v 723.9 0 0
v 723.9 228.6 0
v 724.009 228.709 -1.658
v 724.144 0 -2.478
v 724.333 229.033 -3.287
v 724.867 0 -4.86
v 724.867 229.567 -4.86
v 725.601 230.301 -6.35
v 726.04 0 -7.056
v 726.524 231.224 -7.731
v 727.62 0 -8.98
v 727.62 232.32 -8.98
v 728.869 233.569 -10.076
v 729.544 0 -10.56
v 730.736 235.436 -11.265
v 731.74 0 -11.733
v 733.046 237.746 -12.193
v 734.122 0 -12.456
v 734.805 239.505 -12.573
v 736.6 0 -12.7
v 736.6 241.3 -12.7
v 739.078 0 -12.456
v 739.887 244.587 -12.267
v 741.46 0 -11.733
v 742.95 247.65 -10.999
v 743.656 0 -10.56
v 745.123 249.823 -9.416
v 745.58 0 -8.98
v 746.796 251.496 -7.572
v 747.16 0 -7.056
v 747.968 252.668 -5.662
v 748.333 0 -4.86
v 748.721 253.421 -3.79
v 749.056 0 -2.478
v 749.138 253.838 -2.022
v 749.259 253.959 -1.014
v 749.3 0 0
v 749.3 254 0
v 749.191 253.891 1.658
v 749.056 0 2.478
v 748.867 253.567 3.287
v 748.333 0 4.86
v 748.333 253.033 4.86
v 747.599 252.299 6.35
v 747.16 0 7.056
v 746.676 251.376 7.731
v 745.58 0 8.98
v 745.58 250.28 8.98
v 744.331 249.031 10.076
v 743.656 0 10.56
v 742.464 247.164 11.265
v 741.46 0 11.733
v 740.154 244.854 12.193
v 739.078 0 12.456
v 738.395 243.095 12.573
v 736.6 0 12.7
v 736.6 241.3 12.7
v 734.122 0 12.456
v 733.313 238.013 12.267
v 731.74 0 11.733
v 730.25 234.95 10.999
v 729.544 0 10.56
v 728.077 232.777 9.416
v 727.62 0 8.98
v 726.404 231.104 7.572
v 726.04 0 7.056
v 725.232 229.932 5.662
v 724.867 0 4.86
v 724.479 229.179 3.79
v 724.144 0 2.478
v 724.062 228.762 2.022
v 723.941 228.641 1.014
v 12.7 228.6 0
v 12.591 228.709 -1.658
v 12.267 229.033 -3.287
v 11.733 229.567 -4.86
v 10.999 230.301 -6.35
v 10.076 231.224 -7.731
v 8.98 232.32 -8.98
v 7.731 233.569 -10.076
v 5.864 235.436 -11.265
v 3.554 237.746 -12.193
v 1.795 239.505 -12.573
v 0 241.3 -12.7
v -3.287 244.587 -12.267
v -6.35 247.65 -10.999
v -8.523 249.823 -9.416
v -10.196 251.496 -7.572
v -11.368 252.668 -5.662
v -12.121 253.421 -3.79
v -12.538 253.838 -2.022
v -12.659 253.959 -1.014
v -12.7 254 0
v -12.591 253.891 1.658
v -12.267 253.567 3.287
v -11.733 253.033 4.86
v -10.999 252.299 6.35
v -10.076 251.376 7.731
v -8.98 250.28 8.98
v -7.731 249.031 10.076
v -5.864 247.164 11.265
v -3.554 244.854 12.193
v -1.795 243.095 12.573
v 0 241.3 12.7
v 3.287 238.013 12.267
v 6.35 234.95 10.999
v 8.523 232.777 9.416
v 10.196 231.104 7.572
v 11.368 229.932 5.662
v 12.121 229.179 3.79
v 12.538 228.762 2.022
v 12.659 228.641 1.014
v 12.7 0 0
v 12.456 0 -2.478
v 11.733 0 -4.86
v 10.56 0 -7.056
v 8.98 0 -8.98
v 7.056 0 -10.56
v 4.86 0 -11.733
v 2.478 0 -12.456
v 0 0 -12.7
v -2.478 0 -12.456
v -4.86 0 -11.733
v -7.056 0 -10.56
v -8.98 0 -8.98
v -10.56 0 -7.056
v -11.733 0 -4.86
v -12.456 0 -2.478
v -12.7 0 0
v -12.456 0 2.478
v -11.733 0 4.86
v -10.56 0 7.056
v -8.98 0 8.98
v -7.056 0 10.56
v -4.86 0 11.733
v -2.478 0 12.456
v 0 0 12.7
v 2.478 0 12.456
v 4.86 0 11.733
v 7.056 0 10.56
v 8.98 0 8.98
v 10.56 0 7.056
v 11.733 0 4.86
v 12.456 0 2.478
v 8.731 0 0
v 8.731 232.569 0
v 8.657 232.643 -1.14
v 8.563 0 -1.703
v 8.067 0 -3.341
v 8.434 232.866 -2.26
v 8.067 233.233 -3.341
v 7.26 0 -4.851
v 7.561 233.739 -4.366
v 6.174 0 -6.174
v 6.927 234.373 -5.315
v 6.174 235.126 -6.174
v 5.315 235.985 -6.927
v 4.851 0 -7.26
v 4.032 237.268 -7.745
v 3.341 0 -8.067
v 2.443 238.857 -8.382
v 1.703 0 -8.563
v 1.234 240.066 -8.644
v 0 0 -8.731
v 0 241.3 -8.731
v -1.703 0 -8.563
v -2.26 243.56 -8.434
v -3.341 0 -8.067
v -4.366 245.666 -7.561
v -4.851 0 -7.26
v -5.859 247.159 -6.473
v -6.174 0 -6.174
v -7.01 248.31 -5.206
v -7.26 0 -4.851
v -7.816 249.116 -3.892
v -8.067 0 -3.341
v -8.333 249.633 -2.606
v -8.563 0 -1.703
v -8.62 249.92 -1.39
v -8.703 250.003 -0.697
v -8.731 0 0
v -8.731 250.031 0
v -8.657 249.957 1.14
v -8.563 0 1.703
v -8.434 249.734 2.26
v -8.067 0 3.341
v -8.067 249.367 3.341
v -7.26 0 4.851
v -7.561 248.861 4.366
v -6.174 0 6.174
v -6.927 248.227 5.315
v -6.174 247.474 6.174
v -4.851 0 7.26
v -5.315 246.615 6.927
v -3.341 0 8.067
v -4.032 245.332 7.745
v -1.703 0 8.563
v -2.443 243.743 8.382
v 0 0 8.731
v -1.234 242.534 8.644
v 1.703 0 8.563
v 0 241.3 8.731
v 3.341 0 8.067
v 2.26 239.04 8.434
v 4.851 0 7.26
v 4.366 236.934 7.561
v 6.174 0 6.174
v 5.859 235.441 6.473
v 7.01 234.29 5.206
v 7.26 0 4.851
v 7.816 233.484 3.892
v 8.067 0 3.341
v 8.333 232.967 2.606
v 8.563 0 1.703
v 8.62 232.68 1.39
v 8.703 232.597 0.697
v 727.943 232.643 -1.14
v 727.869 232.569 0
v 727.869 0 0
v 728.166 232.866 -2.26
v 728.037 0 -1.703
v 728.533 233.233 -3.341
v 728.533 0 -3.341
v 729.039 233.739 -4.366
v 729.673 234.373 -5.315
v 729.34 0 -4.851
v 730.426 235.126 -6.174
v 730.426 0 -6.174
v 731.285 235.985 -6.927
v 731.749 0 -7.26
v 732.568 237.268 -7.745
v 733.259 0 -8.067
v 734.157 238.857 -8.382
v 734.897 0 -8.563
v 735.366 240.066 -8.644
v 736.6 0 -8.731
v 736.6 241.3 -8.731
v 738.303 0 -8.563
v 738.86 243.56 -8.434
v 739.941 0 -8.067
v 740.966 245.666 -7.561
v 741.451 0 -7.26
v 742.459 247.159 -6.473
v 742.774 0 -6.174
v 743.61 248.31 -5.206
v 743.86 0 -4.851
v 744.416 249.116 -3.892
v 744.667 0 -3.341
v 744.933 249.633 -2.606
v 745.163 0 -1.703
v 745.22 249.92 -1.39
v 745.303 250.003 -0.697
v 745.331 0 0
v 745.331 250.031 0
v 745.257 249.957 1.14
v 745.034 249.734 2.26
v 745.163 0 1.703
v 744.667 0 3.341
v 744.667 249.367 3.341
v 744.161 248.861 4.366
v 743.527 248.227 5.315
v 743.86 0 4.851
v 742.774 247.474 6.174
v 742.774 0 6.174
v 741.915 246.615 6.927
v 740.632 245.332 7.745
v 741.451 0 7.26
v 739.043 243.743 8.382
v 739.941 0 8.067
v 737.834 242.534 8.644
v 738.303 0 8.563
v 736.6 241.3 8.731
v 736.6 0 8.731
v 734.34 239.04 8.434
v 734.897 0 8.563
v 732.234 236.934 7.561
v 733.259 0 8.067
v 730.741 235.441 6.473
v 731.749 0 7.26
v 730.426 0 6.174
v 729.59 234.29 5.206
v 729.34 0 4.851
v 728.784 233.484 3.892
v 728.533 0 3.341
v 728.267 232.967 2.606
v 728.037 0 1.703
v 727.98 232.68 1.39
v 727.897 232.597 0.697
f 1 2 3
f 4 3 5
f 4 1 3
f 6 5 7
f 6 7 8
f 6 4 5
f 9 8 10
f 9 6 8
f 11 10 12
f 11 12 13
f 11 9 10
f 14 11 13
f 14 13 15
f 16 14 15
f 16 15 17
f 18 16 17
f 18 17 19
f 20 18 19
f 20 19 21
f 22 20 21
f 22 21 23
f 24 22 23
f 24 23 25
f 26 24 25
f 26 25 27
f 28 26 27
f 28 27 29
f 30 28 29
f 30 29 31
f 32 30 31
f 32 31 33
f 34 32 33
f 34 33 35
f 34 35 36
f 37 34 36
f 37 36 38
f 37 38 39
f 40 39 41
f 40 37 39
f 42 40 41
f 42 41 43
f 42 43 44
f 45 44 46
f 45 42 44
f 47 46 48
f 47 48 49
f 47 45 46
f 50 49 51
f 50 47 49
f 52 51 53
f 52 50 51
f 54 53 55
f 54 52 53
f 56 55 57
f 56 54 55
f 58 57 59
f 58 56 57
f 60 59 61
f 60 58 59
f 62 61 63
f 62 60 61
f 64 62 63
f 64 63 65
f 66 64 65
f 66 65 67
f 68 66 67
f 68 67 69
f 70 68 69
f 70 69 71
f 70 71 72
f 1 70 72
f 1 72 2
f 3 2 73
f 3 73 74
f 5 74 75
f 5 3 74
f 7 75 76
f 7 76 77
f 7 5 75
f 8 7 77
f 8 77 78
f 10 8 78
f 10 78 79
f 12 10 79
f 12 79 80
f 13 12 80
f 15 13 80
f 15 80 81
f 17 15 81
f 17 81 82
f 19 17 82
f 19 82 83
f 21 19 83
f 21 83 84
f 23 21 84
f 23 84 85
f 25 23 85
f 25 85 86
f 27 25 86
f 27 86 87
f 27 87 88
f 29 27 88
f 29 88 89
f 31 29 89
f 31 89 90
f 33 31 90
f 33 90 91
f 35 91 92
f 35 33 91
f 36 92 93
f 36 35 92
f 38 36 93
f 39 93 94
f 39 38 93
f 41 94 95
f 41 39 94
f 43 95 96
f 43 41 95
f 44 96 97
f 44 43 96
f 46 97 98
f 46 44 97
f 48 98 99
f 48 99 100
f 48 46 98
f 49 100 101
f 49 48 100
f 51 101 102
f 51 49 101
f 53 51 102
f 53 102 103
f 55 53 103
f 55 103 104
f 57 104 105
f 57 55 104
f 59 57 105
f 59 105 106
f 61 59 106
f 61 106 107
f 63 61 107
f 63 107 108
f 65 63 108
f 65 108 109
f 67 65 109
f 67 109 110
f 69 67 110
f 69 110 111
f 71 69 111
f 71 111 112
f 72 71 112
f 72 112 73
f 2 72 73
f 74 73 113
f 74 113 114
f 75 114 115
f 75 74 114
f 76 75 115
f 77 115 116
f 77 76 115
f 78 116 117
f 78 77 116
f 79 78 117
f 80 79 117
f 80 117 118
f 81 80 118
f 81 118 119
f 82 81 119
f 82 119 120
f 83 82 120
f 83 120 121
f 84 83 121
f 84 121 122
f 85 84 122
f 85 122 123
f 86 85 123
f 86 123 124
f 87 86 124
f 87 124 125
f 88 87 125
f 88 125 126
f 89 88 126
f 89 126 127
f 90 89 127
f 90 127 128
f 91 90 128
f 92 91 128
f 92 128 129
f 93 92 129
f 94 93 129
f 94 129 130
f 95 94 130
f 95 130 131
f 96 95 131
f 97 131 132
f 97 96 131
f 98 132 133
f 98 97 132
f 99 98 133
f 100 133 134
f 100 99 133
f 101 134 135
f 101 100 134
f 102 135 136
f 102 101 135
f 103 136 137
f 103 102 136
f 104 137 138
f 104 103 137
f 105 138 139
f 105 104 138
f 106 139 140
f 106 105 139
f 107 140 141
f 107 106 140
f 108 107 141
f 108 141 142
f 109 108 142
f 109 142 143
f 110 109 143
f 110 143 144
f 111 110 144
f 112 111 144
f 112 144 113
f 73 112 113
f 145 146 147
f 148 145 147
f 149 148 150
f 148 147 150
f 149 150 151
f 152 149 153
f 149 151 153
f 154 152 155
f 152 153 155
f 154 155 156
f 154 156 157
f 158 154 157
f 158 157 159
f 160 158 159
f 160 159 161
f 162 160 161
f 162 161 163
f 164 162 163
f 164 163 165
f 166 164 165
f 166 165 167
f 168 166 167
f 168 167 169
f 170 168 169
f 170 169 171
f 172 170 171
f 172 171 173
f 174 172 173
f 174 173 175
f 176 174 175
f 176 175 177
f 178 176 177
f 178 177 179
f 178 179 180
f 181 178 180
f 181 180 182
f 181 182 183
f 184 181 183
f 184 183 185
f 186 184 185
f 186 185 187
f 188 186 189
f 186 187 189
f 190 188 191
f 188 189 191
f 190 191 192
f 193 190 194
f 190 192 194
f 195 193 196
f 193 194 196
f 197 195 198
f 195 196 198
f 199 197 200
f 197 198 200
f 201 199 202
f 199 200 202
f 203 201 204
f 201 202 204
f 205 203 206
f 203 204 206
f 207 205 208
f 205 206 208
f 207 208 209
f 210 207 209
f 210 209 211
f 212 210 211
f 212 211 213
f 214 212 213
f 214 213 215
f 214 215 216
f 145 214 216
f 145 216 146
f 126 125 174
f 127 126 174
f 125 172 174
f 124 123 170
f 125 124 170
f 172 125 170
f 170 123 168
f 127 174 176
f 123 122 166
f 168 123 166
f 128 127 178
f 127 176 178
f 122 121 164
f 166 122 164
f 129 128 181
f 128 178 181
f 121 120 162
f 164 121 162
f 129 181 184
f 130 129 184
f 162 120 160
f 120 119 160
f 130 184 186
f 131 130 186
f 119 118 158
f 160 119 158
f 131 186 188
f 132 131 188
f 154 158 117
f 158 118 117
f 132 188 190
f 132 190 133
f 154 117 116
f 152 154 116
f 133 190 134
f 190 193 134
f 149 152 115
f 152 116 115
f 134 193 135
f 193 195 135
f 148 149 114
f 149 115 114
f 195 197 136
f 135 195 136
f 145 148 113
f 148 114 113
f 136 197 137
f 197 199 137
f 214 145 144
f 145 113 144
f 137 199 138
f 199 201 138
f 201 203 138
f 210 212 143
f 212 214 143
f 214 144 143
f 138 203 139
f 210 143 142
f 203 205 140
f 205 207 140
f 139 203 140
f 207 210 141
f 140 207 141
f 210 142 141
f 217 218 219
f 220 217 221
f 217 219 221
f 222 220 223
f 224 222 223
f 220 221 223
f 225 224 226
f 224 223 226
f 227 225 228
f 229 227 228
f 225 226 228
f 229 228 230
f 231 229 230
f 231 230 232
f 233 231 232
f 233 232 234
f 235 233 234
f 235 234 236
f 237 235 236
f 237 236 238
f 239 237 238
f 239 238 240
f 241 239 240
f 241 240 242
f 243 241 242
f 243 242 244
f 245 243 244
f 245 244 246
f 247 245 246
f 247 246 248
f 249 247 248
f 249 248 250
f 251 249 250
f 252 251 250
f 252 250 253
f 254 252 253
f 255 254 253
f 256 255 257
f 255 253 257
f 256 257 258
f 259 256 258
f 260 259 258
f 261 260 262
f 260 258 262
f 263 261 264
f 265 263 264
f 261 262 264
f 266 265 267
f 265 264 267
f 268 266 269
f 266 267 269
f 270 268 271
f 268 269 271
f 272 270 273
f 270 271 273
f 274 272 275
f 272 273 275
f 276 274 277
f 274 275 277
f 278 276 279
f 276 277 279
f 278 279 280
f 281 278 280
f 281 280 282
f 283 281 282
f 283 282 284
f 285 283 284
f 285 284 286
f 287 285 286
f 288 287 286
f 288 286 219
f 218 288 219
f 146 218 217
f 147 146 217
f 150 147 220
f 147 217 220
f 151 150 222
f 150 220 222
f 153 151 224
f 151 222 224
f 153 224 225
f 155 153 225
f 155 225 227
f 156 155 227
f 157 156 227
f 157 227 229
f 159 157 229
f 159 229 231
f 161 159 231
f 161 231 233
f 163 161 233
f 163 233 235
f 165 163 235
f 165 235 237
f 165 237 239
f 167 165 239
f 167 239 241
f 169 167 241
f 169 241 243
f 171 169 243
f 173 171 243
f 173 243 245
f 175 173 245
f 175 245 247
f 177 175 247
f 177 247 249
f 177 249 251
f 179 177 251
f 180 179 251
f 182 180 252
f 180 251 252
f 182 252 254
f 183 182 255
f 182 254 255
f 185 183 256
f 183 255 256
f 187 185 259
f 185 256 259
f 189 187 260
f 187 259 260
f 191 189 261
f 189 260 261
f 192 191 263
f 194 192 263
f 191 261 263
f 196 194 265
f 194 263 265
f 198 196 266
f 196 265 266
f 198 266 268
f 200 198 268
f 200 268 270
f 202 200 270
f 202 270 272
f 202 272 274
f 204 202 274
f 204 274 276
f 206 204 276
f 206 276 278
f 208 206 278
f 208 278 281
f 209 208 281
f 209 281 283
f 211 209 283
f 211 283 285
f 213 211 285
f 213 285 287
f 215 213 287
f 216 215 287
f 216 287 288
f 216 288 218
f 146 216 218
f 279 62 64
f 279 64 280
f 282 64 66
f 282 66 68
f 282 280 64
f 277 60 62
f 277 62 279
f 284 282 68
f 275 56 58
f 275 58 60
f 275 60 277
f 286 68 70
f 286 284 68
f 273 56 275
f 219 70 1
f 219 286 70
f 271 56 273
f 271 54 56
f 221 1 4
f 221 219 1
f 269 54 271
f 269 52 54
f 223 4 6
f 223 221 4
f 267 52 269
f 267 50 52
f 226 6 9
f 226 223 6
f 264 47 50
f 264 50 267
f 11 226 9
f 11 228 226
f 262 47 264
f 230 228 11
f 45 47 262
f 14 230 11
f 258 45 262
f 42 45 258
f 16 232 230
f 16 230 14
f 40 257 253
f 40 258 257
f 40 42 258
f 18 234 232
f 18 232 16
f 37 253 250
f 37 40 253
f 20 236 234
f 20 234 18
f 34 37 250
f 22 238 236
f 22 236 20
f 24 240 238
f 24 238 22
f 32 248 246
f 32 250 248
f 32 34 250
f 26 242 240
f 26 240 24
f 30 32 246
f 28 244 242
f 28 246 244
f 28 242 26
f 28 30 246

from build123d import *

# Parameters (mm, degrees)
SKETCH3_R   = 12.7
SKETCH3_R_2 = 8.73125


with BuildPart() as part:
    # Sweep1: sweep along a path in Sketch1
    with BuildLine(Plane.XY) as sweep1_path:
        Line((0, 0), (0, 241.3))
        Line((0, 241.3), (736.6, 241.3))
        Line((736.6, 241.3), (736.6, 0))
    # Sketch3 → Sweep1 (sweep)
    with BuildSketch(Plane(origin=(0, 0, 0), x_dir=(1, 0, 0), z_dir=(0, 1, 0))):
        Circle(SKETCH3_R)
        Circle(SKETCH3_R_2, mode=Mode.SUBTRACT)
    sweep(path=sweep1_path.line, transition=Transition.RIGHT)


solid = part.part
